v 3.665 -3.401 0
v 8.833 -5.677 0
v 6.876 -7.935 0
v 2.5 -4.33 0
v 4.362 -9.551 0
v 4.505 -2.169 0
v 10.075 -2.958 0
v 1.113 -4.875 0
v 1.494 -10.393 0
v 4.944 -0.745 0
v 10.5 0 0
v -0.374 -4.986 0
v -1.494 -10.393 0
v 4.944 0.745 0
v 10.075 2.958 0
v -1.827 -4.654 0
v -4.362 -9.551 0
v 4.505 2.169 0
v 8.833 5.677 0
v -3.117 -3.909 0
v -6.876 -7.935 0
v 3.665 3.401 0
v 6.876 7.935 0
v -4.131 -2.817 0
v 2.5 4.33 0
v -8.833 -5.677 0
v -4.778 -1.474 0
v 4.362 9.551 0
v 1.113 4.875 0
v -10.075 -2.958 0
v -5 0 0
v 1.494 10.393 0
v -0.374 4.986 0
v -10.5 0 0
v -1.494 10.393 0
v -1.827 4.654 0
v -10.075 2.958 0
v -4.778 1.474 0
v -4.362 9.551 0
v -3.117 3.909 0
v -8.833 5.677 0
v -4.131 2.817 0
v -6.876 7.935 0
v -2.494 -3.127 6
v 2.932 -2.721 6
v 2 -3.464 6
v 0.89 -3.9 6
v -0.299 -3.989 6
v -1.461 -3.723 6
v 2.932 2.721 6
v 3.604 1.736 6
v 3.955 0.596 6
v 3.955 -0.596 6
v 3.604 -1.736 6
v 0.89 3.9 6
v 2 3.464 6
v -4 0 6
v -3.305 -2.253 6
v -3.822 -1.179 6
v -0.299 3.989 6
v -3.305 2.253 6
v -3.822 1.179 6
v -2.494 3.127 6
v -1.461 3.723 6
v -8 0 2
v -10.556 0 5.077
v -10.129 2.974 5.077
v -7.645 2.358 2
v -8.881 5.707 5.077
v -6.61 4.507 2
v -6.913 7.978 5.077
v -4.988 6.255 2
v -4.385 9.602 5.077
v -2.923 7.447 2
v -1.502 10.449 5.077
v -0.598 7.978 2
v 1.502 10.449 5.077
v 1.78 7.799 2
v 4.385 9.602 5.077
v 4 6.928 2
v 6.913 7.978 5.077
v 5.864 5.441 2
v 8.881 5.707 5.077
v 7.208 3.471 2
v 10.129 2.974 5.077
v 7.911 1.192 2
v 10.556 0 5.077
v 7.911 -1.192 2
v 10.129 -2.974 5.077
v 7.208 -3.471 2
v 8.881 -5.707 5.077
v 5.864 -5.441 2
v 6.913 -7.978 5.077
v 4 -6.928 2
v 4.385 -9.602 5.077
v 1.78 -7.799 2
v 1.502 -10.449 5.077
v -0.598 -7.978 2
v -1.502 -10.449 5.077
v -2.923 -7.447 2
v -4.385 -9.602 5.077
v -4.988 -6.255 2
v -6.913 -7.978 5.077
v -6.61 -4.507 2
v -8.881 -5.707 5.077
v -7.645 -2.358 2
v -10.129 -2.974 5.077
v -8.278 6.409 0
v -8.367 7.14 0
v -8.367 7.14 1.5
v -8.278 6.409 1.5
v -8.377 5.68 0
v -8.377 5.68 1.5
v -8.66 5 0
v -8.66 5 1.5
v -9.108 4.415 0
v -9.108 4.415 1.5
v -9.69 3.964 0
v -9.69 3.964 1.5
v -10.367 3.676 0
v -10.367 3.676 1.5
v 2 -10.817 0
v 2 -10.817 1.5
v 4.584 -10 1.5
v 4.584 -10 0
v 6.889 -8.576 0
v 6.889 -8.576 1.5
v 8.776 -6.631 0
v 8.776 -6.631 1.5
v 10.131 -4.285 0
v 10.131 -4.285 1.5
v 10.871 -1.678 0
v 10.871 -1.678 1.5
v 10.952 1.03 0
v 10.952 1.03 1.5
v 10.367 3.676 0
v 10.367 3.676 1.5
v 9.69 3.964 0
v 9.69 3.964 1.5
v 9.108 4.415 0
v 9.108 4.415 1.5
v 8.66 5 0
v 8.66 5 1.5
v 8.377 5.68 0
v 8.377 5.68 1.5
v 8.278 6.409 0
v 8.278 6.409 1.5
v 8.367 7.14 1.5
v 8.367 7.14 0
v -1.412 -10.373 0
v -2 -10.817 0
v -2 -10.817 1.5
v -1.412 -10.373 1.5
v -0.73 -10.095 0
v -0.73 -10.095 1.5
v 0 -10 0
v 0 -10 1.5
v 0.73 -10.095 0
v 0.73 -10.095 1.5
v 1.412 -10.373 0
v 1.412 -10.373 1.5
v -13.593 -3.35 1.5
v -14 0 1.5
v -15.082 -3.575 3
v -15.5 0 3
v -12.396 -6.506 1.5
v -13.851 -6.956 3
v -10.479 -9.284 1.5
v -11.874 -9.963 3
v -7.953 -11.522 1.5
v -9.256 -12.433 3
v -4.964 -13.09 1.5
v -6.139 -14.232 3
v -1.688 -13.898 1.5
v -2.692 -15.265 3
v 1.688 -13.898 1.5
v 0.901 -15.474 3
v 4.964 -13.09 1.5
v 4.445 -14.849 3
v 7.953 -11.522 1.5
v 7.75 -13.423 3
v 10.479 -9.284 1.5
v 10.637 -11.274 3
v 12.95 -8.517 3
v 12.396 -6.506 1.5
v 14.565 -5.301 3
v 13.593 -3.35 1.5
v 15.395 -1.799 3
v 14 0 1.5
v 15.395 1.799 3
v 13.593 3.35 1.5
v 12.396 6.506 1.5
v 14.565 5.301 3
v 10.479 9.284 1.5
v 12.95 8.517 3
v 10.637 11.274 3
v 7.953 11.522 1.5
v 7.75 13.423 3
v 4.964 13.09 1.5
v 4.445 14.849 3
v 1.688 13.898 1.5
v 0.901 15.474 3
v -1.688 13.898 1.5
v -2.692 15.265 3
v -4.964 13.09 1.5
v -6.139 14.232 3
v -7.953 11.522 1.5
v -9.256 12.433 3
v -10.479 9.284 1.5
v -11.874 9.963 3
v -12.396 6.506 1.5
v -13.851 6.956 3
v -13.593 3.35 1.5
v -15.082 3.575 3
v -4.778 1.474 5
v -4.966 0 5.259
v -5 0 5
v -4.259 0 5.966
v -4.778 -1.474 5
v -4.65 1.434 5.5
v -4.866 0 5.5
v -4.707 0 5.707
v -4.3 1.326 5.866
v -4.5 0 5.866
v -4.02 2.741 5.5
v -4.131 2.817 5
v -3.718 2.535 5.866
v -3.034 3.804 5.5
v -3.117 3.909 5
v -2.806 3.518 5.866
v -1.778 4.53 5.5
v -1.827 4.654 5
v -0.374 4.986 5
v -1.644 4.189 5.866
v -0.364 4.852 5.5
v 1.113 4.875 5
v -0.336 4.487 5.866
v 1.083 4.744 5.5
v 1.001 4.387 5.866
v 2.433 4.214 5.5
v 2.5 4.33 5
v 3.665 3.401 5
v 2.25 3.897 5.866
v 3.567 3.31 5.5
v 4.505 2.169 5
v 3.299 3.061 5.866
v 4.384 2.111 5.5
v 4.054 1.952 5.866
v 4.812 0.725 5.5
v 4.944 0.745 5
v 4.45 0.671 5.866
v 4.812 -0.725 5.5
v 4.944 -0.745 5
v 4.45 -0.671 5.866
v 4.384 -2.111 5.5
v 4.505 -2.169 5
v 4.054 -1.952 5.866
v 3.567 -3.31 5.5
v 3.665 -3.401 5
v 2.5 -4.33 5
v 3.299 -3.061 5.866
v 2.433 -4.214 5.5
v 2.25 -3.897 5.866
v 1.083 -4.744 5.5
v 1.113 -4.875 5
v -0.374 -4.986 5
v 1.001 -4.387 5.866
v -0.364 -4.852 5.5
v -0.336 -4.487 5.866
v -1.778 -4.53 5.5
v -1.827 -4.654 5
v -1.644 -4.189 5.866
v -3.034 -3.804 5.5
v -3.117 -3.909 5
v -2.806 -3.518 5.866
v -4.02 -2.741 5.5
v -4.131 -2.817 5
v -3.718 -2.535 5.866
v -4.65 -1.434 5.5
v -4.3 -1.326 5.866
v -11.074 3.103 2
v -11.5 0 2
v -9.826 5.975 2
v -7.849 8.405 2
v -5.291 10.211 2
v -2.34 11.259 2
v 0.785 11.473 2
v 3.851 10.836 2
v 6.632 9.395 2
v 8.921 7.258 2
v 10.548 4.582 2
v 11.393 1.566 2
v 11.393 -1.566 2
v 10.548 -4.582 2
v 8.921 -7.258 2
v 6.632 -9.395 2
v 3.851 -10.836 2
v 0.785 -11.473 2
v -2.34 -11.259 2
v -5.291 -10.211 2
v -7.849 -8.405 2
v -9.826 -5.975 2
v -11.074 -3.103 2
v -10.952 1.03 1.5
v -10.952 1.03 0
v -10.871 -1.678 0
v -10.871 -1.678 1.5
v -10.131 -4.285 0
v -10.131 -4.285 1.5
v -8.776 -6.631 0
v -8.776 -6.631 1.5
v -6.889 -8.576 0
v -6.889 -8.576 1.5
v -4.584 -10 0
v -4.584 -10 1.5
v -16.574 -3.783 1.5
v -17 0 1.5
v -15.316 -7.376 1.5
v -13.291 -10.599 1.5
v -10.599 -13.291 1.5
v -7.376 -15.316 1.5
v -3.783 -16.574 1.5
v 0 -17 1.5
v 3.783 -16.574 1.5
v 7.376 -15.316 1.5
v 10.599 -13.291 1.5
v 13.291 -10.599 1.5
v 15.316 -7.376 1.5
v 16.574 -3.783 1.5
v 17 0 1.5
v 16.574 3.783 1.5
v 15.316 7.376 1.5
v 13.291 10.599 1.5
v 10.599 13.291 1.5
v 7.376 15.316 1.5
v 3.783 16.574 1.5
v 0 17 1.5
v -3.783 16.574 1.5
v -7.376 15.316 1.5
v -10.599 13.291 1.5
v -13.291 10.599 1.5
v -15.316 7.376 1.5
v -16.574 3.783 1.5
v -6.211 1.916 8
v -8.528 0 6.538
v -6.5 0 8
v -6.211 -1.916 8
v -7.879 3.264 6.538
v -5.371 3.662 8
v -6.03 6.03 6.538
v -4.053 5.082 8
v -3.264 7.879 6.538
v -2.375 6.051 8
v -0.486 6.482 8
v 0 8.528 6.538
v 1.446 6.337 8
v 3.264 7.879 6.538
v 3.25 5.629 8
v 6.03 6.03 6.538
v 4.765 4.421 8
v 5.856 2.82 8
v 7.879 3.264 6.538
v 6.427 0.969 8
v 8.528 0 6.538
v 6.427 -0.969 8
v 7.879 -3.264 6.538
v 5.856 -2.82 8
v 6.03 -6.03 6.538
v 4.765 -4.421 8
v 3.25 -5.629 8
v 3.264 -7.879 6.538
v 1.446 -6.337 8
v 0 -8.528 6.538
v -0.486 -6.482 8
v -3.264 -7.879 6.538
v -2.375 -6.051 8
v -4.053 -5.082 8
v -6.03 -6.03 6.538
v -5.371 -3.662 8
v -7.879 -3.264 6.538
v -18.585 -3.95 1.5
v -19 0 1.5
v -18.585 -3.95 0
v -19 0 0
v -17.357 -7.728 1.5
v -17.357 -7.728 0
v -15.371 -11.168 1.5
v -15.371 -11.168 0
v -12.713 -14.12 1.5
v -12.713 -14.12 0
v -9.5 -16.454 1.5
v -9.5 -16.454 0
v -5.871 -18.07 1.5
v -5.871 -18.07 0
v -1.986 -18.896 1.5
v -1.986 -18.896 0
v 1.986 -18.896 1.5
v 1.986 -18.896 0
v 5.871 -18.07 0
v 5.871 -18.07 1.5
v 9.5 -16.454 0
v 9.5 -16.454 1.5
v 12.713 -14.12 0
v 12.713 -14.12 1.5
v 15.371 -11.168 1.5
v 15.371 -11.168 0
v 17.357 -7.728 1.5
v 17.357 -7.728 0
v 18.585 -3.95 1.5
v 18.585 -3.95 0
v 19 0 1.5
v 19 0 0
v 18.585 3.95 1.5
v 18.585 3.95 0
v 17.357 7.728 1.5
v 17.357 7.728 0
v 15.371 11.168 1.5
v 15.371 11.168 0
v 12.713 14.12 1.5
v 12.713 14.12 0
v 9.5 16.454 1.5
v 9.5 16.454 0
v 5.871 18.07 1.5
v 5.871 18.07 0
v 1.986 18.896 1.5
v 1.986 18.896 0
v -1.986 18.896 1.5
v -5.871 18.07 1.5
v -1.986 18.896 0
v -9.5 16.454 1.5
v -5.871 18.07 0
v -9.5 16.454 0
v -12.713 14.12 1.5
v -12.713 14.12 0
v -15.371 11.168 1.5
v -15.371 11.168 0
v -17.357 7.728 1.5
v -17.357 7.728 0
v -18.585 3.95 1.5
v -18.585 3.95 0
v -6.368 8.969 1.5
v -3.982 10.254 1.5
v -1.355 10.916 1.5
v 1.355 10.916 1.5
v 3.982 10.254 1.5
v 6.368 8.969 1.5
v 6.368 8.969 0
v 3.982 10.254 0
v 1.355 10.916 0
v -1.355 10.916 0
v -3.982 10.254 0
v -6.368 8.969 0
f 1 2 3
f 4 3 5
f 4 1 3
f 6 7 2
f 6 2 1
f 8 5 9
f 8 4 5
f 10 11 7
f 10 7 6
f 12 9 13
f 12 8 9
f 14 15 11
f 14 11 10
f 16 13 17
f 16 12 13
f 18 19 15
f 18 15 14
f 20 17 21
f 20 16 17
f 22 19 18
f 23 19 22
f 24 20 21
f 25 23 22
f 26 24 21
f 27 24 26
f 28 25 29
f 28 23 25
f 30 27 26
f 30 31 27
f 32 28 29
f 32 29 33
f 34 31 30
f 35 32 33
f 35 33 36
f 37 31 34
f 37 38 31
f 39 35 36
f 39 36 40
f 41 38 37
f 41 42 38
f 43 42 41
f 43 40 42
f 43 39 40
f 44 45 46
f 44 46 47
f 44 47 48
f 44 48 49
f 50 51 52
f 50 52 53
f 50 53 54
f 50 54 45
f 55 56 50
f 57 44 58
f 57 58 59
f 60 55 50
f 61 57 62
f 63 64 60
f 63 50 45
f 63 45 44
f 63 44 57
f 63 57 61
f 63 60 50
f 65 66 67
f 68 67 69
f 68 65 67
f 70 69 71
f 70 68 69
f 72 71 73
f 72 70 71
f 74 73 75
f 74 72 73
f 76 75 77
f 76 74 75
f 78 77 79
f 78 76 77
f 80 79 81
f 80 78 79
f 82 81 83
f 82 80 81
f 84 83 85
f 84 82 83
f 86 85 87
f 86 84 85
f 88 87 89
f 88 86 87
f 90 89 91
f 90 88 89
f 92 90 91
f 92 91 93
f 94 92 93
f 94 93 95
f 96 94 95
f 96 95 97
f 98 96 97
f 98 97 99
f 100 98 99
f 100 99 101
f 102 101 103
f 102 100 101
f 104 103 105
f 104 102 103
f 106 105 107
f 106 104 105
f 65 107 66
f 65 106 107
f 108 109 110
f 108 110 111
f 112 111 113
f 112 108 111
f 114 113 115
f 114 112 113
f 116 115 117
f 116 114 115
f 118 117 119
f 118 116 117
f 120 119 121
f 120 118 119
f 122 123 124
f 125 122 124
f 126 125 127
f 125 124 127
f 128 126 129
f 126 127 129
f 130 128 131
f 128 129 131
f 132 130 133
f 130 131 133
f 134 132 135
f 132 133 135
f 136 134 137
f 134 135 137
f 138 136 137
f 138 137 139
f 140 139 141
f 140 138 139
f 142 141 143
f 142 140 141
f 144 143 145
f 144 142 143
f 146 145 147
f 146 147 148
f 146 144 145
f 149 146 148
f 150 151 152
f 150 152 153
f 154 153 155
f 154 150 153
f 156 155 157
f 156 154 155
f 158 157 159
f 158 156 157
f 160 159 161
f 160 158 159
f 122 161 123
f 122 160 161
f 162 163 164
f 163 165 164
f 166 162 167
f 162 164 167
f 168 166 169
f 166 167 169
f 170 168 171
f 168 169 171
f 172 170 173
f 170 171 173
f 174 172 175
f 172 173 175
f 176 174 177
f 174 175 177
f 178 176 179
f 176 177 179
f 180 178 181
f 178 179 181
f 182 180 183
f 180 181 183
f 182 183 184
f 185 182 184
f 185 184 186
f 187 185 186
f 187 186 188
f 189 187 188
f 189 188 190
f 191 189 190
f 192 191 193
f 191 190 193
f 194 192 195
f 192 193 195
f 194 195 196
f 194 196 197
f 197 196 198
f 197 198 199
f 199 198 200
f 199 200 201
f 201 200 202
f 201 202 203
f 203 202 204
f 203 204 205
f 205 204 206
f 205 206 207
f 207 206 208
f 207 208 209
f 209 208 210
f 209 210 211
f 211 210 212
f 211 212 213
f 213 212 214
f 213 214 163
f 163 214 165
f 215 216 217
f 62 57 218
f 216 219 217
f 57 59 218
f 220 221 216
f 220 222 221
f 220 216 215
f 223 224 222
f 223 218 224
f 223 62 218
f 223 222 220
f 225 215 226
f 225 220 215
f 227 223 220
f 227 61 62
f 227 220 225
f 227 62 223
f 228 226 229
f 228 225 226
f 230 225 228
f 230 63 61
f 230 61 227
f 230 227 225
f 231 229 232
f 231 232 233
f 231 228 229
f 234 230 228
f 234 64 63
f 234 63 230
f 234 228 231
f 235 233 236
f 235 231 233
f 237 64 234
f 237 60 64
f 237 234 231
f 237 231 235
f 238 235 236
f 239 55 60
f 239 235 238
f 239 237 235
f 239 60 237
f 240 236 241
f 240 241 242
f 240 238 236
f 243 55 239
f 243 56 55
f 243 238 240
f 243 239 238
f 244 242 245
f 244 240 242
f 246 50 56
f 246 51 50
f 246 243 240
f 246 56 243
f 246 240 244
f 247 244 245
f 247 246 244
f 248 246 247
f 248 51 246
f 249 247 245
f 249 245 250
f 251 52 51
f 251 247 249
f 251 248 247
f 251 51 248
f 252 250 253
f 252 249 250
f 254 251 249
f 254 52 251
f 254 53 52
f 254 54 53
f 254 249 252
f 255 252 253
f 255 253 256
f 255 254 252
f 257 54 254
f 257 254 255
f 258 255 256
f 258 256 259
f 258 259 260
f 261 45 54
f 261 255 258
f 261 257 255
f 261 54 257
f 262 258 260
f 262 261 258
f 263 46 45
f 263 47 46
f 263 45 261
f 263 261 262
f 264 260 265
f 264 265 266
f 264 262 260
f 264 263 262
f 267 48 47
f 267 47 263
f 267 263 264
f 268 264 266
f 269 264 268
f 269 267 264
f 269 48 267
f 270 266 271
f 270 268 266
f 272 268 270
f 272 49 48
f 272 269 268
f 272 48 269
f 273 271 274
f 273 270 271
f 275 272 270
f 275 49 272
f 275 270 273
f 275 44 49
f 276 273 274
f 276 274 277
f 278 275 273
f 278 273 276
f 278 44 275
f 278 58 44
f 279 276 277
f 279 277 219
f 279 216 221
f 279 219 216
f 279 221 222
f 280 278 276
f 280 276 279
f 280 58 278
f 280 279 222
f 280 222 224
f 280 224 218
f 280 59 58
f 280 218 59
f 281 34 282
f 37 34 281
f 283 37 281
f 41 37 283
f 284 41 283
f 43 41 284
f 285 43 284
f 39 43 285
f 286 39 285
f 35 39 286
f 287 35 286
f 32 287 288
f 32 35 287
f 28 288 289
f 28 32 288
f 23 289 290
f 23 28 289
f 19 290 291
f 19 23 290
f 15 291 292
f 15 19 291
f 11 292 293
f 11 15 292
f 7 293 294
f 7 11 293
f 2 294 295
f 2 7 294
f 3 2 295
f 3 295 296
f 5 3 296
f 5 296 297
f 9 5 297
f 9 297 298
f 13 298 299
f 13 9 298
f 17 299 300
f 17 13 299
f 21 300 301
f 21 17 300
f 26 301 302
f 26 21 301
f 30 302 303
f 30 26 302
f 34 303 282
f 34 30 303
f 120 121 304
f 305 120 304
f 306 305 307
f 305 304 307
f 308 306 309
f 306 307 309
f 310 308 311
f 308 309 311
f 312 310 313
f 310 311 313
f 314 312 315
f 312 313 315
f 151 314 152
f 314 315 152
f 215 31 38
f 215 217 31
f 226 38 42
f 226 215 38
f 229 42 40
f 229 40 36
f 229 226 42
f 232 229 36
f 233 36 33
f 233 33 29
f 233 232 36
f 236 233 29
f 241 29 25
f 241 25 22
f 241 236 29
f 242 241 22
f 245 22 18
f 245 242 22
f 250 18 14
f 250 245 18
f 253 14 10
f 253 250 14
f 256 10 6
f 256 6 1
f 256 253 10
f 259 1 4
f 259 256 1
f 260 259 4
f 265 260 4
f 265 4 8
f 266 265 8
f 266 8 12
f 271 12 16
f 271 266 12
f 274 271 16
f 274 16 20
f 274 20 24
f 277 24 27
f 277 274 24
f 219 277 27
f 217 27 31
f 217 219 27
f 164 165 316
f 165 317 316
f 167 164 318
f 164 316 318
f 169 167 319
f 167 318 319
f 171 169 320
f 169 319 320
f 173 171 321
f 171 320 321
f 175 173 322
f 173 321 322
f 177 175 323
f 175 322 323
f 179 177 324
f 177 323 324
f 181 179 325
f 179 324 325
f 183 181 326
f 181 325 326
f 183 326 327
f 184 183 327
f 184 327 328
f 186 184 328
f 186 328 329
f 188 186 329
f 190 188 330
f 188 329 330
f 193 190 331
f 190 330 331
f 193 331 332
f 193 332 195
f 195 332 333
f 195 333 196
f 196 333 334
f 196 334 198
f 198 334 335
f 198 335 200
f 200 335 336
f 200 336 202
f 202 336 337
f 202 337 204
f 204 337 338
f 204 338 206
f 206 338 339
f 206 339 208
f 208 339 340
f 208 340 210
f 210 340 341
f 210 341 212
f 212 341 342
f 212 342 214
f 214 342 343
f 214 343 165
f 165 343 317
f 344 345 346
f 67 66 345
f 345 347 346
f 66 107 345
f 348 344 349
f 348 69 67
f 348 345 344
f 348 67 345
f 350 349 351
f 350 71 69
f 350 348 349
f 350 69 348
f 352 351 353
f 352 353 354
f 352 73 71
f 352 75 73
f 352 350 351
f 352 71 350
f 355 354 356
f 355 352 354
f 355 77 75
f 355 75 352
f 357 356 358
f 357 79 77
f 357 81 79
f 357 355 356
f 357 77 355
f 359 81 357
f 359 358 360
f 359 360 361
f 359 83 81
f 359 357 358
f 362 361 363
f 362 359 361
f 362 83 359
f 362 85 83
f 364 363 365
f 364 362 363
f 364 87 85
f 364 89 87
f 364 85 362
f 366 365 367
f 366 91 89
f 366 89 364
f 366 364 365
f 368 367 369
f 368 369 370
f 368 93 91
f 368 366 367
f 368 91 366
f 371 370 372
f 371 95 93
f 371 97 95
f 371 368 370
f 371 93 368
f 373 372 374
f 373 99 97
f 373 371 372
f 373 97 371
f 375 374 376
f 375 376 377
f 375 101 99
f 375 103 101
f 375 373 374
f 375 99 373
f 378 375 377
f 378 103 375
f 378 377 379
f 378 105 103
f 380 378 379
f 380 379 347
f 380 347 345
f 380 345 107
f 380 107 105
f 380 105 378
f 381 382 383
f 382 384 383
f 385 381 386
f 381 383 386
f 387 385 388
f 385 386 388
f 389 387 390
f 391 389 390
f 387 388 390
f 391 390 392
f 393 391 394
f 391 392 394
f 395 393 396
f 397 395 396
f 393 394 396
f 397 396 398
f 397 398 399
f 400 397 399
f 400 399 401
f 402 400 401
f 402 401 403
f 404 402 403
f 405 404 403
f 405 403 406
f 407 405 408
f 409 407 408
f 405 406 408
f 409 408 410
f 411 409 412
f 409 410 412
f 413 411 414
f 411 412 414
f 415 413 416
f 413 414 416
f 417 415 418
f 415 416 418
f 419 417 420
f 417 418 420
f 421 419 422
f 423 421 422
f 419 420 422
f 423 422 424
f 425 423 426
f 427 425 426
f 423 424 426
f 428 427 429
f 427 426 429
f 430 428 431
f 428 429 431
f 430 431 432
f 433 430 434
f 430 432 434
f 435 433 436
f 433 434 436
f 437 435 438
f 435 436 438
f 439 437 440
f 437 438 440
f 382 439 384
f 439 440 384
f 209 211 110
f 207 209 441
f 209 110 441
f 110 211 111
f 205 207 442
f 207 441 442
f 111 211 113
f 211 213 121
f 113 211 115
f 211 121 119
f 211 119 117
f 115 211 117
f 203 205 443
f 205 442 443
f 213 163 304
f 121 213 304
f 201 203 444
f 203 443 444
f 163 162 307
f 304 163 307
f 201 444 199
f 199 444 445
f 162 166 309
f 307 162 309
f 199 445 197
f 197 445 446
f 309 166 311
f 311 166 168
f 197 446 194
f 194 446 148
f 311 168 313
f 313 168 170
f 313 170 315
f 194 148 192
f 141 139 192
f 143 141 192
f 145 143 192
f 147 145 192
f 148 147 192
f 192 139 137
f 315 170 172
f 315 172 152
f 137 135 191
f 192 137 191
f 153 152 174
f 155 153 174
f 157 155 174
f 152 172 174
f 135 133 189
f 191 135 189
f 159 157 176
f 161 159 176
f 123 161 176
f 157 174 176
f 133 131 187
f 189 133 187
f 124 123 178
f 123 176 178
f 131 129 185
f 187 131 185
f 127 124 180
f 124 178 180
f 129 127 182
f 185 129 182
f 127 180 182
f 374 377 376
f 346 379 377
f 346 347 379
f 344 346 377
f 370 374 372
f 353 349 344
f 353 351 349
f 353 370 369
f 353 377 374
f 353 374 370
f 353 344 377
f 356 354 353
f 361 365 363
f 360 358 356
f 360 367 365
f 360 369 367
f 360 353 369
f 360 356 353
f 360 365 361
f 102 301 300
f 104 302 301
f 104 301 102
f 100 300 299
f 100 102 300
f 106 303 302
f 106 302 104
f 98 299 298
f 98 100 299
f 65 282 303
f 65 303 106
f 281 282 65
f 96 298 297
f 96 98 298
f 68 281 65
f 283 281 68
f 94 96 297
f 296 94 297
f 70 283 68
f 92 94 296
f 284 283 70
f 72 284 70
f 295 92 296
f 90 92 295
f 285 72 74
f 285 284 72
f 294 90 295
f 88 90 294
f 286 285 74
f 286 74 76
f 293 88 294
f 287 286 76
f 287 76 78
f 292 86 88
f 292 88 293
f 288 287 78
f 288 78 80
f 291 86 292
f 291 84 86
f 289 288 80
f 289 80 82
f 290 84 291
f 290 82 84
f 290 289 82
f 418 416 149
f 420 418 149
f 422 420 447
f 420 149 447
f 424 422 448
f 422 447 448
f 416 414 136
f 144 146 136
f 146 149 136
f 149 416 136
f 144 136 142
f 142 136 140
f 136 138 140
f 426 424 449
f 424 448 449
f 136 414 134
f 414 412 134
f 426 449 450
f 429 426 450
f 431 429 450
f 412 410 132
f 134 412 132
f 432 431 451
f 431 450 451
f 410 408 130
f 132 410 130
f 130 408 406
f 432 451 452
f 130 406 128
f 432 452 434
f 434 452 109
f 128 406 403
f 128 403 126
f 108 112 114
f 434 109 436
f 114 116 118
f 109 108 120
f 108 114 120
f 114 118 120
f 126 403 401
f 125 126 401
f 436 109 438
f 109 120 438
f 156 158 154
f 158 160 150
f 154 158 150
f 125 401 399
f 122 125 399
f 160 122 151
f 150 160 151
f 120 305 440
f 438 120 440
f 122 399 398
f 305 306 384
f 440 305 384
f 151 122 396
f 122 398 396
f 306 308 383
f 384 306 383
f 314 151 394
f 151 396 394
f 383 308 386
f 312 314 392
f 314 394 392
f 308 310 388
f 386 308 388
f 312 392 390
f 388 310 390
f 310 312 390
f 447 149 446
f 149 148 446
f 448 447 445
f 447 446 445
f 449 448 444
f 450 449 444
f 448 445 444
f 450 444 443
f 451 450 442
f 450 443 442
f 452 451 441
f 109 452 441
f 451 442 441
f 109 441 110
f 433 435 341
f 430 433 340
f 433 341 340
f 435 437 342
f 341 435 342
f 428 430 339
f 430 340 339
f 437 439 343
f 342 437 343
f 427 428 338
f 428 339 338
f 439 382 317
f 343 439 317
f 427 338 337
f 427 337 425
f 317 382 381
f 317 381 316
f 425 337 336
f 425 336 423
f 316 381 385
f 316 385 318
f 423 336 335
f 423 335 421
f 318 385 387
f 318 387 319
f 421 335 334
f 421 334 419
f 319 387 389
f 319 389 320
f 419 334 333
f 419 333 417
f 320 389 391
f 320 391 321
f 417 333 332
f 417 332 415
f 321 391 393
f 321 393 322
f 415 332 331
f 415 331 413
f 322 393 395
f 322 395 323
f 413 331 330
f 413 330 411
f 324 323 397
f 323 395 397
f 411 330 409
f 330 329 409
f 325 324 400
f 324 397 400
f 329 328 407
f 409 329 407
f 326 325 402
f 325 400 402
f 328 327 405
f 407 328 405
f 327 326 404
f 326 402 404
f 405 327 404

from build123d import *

# Parameters (mm, degrees)
F5_DEPTH = 1.5


with BuildPart() as f1:
    # F0 (on Front) → F1 (revolve)
    with BuildSketch(Plane.XZ):
        with BuildLine():
            Line((-11.5, 2), (-10.5, 0))
            Line((-10.5, 0), (-5, 0))
            Line((-5, 0), (-5, 5))
            ThreePointArc((-5, 5), (-4.7071067812, 5.7071067812), (-4, 6))
            Line((-4, 6), (0, 6))
            Line((0, 6), (0, 8))
            Line((0, 8), (-6.5, 8))
            Line((-6.5, 8), (-10.5563024928, 5.0765756232))
            Line((-10.5563024928, 5.0765756232), (-8, 2))
            Line((-8, 2), (-11.5, 2))
        make_face()
    revolve(axis=Axis((0, 0, 7), (0, 0, -1)))


with BuildPart() as f3:
    # F2 (on Front) → F3 (revolve)
    with BuildSketch(Plane.XZ):
        Polygon((-19, 1.5), (-19, 0), (-11, 0), (-11, 1.5), (-14, 1.5), (-15.500000224, 3), (-17, 1.5), align=None)
    revolve(axis=Axis((0, 0, 1.6170465387), (0, 0, 1)))

    # F4 (on face) → F5 (join, through all)
    with BuildSketch(Plane(origin=(0, 0, 0), x_dir=(1, 0, 0), z_dir=(0, 0, -1))):
        with BuildLine():
            ThreePointArc((2, 10.8166538264), (0, 11), (-2, 10.8166538264))
            ThreePointArc((-2, 10.8166538264), (0, 10), (2, 10.8166538264))
        make_face()
        with BuildLine():
            ThreePointArc((-8.3674969976, -7.1403777208), (-8.6602540378, -5), (-10.3674969976, -3.6762761056))
            ThreePointArc((-10.3674969976, -3.6762761056), (-9.5262794416, -5.5), (-8.3674969976, -7.1403777208))
        make_face()
        with BuildLine():
            ThreePointArc((8.3674969976, -7.1403777208), (9.5262794416, -5.5), (10.3674969976, -3.6762761056))
            ThreePointArc((10.3674969976, -3.6762761056), (8.6602540378, -5), (8.3674969976, -7.1403777208))
        make_face()
    extrude(amount=-F5_DEPTH)


solid = Compound([f1.part, f3.part])
